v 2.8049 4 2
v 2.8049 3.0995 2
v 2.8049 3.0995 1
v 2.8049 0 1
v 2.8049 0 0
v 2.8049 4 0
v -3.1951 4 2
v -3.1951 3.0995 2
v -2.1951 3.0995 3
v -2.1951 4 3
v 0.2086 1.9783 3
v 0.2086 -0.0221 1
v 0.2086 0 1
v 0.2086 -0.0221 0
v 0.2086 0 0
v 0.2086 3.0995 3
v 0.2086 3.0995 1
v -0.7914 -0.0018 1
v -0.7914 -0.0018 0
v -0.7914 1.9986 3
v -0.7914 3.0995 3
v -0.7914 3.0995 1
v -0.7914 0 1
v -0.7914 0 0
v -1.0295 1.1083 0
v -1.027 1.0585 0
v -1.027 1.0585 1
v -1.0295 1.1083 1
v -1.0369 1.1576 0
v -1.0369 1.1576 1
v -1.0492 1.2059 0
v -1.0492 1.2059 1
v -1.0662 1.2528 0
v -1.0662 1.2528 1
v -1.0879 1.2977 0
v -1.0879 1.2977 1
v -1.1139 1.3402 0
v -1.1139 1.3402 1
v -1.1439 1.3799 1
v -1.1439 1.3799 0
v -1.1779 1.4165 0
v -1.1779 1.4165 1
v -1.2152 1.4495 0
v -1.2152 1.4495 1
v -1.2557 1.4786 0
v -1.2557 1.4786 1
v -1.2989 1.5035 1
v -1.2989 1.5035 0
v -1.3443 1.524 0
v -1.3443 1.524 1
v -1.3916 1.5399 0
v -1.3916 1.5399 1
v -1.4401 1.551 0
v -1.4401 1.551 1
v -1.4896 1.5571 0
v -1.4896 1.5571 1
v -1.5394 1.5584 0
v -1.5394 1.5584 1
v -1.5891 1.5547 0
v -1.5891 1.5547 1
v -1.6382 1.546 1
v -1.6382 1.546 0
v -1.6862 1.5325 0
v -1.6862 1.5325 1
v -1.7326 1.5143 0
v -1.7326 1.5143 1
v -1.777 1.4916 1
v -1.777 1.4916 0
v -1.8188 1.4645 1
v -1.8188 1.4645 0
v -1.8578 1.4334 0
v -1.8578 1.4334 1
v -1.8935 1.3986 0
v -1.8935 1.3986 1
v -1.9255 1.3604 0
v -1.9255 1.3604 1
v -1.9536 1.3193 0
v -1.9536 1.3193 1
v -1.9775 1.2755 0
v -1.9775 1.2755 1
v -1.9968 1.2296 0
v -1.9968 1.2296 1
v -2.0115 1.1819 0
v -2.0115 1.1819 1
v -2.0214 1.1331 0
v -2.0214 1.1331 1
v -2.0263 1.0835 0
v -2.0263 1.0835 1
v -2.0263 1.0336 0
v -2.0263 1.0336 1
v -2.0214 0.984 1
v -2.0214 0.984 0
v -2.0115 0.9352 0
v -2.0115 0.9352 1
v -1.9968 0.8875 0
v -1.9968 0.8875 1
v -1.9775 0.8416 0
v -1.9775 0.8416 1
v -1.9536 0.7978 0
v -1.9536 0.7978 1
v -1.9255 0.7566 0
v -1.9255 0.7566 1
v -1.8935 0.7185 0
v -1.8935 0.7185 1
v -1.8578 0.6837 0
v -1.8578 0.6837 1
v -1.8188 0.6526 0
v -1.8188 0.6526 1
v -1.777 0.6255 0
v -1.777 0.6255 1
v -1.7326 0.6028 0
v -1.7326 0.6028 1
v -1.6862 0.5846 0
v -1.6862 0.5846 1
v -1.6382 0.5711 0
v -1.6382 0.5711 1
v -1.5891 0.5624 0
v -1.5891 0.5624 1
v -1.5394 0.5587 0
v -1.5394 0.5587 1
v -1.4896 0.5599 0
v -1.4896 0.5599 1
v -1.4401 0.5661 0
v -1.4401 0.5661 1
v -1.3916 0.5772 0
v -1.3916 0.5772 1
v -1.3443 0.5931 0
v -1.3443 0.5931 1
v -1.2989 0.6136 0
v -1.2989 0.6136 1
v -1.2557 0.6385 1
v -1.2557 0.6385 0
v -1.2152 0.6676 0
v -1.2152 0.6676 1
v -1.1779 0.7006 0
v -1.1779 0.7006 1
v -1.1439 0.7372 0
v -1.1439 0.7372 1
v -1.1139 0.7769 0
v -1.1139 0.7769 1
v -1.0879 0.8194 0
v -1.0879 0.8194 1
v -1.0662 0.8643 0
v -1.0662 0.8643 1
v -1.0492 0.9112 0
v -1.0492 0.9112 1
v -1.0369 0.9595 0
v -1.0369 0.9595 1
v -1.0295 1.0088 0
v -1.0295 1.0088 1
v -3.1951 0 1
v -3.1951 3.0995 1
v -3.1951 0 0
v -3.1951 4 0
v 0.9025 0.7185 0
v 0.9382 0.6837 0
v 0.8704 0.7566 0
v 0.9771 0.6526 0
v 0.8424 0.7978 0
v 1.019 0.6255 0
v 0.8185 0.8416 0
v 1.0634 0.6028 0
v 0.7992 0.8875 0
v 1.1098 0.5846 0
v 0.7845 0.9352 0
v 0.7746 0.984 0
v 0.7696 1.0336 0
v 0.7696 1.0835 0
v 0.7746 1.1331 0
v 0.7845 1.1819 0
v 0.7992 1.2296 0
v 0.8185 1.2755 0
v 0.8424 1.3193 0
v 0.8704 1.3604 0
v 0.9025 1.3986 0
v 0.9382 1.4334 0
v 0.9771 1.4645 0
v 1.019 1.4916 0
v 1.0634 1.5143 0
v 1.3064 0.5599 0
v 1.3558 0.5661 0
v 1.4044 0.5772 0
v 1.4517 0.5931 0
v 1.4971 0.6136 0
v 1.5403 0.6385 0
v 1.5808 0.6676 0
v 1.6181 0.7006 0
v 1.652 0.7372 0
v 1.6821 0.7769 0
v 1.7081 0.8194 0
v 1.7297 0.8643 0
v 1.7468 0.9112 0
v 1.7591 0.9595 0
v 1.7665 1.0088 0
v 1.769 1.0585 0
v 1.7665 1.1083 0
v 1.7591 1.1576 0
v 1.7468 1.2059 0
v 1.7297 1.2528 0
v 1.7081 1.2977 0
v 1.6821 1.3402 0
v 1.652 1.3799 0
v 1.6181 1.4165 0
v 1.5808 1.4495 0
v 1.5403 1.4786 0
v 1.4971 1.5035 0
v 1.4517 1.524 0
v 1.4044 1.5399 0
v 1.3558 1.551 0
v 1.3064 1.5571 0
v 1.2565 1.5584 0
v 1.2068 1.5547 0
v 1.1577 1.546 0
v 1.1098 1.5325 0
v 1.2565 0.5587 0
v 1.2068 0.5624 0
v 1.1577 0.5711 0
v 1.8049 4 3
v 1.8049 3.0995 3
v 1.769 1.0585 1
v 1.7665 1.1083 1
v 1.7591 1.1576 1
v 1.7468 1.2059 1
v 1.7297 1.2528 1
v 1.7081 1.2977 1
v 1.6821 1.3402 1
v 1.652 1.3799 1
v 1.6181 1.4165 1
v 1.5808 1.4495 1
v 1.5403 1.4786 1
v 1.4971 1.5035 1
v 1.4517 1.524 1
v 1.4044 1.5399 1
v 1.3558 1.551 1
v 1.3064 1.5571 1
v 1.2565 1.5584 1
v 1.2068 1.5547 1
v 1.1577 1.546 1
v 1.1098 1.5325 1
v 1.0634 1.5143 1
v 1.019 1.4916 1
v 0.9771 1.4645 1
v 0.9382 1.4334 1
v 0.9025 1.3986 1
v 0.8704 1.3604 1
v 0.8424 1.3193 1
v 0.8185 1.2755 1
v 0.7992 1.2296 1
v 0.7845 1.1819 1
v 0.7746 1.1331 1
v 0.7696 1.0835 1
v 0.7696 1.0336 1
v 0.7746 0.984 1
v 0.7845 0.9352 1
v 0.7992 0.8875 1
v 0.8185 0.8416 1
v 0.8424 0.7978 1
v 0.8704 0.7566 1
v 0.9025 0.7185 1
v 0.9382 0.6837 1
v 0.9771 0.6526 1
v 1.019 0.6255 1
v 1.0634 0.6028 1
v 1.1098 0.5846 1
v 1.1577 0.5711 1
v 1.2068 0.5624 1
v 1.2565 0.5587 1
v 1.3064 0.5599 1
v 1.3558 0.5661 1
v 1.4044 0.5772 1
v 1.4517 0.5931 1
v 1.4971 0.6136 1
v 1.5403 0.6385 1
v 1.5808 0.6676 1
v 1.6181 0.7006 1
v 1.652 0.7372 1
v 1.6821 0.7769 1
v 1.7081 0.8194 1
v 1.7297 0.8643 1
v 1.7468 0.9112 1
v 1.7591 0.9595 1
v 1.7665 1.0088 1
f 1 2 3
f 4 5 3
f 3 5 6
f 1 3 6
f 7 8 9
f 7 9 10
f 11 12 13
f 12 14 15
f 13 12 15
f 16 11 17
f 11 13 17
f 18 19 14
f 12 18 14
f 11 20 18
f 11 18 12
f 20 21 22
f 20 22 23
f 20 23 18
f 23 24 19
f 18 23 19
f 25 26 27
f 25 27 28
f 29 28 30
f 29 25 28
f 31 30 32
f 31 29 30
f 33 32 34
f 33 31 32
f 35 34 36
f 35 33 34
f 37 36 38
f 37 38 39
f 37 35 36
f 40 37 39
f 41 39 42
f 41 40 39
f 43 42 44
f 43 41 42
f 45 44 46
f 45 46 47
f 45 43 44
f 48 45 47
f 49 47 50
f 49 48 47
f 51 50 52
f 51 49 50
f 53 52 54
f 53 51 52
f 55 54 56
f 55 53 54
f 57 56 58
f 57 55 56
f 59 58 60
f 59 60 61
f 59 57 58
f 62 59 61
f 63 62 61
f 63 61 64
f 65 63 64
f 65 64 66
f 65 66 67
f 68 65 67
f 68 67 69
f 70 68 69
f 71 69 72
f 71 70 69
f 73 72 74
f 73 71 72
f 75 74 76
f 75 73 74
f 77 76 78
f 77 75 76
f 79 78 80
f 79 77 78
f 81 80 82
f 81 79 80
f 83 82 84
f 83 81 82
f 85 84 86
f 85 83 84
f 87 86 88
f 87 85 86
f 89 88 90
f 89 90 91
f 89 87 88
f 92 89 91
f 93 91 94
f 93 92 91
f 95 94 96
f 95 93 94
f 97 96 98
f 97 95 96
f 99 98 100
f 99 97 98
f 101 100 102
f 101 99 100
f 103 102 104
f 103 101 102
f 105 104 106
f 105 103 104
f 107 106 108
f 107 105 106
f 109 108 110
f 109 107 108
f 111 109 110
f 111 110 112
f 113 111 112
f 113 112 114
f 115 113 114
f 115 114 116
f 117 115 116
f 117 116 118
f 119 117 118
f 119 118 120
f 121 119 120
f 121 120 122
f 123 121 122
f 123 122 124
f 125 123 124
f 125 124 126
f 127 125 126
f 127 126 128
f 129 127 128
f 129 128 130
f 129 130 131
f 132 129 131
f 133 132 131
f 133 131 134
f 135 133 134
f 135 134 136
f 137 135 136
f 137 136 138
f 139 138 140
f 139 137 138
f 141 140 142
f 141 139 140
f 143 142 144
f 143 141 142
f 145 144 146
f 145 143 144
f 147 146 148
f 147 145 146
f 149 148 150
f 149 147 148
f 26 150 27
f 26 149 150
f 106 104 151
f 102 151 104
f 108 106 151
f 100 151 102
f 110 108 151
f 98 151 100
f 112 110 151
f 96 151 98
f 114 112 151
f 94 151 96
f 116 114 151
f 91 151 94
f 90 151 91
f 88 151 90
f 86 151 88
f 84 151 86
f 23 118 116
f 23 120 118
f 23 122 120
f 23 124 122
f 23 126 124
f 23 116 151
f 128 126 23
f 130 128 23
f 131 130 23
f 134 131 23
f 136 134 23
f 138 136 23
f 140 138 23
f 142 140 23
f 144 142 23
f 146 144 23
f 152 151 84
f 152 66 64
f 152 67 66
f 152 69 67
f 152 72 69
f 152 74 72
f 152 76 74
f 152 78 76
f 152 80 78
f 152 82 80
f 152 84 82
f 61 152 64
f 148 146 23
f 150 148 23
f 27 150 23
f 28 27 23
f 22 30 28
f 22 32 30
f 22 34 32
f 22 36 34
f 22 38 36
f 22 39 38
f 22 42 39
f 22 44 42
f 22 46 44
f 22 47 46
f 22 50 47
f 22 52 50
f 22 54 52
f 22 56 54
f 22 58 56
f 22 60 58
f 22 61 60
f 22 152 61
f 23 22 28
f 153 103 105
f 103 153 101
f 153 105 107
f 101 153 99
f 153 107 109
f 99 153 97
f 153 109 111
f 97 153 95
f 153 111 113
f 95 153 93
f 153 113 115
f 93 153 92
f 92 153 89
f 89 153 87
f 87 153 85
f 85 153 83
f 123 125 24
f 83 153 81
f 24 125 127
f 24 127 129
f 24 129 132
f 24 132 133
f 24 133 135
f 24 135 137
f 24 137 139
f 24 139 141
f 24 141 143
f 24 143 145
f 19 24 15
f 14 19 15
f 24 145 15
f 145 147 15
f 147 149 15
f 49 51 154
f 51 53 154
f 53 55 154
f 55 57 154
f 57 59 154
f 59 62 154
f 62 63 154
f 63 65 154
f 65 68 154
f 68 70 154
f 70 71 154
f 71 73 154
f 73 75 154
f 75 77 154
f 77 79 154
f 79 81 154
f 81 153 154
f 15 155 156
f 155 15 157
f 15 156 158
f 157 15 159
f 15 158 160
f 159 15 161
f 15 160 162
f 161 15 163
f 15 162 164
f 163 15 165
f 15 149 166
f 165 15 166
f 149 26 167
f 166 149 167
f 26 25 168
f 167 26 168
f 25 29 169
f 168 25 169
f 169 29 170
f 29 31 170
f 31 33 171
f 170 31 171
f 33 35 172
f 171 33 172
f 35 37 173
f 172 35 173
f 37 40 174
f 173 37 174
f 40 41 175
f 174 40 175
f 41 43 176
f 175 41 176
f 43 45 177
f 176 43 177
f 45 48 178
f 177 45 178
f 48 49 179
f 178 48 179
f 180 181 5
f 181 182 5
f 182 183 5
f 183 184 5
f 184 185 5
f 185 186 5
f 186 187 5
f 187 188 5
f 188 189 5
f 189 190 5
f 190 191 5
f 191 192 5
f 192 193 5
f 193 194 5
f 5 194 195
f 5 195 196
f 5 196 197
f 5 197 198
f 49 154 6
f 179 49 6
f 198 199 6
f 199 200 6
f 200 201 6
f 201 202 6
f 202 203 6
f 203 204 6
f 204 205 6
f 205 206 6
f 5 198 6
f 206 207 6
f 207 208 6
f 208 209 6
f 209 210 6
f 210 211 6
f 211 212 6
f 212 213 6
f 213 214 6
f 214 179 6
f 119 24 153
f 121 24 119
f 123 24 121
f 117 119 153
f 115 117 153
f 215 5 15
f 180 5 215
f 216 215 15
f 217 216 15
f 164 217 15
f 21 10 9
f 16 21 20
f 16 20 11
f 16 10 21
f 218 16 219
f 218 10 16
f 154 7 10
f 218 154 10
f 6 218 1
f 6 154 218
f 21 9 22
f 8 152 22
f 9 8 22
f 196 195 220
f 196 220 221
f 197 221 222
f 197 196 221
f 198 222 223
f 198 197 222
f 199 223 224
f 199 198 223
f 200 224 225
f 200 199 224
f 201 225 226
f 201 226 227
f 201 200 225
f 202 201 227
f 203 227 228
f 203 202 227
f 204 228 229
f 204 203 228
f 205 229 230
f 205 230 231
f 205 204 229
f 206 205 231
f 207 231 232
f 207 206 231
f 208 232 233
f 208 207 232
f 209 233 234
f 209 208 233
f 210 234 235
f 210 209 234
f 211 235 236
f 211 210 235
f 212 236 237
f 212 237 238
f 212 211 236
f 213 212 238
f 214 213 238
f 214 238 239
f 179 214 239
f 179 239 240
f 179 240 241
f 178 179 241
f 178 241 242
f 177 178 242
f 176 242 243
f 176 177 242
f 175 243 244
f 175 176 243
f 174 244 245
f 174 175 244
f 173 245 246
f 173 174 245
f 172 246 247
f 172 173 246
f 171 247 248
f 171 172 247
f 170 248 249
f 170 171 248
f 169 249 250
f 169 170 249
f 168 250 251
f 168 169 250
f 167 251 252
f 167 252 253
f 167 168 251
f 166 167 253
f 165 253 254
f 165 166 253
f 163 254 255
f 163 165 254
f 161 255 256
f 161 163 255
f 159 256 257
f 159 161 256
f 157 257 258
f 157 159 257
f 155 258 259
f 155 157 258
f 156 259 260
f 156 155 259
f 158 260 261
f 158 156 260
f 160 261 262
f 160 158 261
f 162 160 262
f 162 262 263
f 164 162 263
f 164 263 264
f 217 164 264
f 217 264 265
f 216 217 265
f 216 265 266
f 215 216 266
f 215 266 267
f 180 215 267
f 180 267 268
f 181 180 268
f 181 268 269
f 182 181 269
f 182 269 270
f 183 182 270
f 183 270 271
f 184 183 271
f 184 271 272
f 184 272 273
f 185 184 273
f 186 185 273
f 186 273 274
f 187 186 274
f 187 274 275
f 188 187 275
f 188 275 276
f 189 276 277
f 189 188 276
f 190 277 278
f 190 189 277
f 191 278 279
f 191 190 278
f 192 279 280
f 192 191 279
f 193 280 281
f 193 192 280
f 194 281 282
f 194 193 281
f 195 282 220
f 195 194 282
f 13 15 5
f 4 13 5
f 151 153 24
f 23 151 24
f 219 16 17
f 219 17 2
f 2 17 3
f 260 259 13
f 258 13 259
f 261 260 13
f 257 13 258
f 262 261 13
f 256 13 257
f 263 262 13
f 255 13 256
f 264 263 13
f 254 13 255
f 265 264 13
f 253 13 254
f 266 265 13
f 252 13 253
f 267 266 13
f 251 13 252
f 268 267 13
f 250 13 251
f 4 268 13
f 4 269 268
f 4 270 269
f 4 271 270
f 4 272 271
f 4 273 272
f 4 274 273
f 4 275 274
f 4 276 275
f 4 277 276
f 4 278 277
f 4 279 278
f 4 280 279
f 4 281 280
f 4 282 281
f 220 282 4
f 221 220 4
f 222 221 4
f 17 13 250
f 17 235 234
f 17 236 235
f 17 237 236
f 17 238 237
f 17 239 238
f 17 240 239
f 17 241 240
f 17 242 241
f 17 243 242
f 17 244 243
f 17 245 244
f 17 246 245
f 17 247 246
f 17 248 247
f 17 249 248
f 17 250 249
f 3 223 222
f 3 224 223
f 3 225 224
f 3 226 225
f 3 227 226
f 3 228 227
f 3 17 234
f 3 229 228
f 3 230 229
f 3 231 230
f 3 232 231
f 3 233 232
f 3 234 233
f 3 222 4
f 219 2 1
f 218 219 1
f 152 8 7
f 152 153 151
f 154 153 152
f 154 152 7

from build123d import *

# Parameters (mm, degrees)
F0_W     = 6
F0_H     = 3.099458
F0_R     = 0.5
F1_DEPTH = 1
F0_H_2   = 0.900542
F2_DEPTH = 3
F4_DEPTH = 3
F5_SIZE  = 1
F6_SIZE  = 1
F7_SIZE  = 2


with BuildPart() as f1:
    # F0 (on Top) → F1 (new body)
    with BuildSketch(Plane.XY):
        with Locations((-0.195067, 1.549729)):
            Rectangle(F0_W, F0_H)
        with Locations((-1.526971, 1.058547)):
            Circle(F0_R, mode=Mode.SUBTRACT)
        with Locations((1.269008, 1.058547)):
            Circle(F0_R, mode=Mode.SUBTRACT)
    extrude(amount=F1_DEPTH)

    # F0 (on Top) → F2 (join)
    with BuildSketch(Plane.XY):
        with Locations((-0.195067, 3.549729)):
            Rectangle(F0_W, F0_H_2)
    extrude(amount=F2_DEPTH)

    # F3 (on Top) → F4 (join)
    with BuildSketch(Plane.XY):
        Polygon((0.208575, 3.160667), (-0.791425, 3.173689), (-0.791425, -0.001802), (0.208575, -0.022109), align=None)
    extrude(amount=F4_DEPTH)

    # F5
    f5_edges = [f1.edges().sort_by_distance(p)[0] for p in [
        (2.804933, 3.549729, 3),
    ]]
    chamfer(f5_edges, length=F5_SIZE)

    # F6
    f6_edges = [f1.edges().sort_by_distance(p)[0] for p in [
        (-3.195067, 3.549729, 3),
    ]]
    chamfer(f6_edges, length=F6_SIZE)

    # F7
    f7_edges = [f1.edges().sort_by_distance(p)[0] for p in [
        (-0.291425, -0.011956, 3),
    ]]
    chamfer(f7_edges, length=F7_SIZE)


solid = f1.part
